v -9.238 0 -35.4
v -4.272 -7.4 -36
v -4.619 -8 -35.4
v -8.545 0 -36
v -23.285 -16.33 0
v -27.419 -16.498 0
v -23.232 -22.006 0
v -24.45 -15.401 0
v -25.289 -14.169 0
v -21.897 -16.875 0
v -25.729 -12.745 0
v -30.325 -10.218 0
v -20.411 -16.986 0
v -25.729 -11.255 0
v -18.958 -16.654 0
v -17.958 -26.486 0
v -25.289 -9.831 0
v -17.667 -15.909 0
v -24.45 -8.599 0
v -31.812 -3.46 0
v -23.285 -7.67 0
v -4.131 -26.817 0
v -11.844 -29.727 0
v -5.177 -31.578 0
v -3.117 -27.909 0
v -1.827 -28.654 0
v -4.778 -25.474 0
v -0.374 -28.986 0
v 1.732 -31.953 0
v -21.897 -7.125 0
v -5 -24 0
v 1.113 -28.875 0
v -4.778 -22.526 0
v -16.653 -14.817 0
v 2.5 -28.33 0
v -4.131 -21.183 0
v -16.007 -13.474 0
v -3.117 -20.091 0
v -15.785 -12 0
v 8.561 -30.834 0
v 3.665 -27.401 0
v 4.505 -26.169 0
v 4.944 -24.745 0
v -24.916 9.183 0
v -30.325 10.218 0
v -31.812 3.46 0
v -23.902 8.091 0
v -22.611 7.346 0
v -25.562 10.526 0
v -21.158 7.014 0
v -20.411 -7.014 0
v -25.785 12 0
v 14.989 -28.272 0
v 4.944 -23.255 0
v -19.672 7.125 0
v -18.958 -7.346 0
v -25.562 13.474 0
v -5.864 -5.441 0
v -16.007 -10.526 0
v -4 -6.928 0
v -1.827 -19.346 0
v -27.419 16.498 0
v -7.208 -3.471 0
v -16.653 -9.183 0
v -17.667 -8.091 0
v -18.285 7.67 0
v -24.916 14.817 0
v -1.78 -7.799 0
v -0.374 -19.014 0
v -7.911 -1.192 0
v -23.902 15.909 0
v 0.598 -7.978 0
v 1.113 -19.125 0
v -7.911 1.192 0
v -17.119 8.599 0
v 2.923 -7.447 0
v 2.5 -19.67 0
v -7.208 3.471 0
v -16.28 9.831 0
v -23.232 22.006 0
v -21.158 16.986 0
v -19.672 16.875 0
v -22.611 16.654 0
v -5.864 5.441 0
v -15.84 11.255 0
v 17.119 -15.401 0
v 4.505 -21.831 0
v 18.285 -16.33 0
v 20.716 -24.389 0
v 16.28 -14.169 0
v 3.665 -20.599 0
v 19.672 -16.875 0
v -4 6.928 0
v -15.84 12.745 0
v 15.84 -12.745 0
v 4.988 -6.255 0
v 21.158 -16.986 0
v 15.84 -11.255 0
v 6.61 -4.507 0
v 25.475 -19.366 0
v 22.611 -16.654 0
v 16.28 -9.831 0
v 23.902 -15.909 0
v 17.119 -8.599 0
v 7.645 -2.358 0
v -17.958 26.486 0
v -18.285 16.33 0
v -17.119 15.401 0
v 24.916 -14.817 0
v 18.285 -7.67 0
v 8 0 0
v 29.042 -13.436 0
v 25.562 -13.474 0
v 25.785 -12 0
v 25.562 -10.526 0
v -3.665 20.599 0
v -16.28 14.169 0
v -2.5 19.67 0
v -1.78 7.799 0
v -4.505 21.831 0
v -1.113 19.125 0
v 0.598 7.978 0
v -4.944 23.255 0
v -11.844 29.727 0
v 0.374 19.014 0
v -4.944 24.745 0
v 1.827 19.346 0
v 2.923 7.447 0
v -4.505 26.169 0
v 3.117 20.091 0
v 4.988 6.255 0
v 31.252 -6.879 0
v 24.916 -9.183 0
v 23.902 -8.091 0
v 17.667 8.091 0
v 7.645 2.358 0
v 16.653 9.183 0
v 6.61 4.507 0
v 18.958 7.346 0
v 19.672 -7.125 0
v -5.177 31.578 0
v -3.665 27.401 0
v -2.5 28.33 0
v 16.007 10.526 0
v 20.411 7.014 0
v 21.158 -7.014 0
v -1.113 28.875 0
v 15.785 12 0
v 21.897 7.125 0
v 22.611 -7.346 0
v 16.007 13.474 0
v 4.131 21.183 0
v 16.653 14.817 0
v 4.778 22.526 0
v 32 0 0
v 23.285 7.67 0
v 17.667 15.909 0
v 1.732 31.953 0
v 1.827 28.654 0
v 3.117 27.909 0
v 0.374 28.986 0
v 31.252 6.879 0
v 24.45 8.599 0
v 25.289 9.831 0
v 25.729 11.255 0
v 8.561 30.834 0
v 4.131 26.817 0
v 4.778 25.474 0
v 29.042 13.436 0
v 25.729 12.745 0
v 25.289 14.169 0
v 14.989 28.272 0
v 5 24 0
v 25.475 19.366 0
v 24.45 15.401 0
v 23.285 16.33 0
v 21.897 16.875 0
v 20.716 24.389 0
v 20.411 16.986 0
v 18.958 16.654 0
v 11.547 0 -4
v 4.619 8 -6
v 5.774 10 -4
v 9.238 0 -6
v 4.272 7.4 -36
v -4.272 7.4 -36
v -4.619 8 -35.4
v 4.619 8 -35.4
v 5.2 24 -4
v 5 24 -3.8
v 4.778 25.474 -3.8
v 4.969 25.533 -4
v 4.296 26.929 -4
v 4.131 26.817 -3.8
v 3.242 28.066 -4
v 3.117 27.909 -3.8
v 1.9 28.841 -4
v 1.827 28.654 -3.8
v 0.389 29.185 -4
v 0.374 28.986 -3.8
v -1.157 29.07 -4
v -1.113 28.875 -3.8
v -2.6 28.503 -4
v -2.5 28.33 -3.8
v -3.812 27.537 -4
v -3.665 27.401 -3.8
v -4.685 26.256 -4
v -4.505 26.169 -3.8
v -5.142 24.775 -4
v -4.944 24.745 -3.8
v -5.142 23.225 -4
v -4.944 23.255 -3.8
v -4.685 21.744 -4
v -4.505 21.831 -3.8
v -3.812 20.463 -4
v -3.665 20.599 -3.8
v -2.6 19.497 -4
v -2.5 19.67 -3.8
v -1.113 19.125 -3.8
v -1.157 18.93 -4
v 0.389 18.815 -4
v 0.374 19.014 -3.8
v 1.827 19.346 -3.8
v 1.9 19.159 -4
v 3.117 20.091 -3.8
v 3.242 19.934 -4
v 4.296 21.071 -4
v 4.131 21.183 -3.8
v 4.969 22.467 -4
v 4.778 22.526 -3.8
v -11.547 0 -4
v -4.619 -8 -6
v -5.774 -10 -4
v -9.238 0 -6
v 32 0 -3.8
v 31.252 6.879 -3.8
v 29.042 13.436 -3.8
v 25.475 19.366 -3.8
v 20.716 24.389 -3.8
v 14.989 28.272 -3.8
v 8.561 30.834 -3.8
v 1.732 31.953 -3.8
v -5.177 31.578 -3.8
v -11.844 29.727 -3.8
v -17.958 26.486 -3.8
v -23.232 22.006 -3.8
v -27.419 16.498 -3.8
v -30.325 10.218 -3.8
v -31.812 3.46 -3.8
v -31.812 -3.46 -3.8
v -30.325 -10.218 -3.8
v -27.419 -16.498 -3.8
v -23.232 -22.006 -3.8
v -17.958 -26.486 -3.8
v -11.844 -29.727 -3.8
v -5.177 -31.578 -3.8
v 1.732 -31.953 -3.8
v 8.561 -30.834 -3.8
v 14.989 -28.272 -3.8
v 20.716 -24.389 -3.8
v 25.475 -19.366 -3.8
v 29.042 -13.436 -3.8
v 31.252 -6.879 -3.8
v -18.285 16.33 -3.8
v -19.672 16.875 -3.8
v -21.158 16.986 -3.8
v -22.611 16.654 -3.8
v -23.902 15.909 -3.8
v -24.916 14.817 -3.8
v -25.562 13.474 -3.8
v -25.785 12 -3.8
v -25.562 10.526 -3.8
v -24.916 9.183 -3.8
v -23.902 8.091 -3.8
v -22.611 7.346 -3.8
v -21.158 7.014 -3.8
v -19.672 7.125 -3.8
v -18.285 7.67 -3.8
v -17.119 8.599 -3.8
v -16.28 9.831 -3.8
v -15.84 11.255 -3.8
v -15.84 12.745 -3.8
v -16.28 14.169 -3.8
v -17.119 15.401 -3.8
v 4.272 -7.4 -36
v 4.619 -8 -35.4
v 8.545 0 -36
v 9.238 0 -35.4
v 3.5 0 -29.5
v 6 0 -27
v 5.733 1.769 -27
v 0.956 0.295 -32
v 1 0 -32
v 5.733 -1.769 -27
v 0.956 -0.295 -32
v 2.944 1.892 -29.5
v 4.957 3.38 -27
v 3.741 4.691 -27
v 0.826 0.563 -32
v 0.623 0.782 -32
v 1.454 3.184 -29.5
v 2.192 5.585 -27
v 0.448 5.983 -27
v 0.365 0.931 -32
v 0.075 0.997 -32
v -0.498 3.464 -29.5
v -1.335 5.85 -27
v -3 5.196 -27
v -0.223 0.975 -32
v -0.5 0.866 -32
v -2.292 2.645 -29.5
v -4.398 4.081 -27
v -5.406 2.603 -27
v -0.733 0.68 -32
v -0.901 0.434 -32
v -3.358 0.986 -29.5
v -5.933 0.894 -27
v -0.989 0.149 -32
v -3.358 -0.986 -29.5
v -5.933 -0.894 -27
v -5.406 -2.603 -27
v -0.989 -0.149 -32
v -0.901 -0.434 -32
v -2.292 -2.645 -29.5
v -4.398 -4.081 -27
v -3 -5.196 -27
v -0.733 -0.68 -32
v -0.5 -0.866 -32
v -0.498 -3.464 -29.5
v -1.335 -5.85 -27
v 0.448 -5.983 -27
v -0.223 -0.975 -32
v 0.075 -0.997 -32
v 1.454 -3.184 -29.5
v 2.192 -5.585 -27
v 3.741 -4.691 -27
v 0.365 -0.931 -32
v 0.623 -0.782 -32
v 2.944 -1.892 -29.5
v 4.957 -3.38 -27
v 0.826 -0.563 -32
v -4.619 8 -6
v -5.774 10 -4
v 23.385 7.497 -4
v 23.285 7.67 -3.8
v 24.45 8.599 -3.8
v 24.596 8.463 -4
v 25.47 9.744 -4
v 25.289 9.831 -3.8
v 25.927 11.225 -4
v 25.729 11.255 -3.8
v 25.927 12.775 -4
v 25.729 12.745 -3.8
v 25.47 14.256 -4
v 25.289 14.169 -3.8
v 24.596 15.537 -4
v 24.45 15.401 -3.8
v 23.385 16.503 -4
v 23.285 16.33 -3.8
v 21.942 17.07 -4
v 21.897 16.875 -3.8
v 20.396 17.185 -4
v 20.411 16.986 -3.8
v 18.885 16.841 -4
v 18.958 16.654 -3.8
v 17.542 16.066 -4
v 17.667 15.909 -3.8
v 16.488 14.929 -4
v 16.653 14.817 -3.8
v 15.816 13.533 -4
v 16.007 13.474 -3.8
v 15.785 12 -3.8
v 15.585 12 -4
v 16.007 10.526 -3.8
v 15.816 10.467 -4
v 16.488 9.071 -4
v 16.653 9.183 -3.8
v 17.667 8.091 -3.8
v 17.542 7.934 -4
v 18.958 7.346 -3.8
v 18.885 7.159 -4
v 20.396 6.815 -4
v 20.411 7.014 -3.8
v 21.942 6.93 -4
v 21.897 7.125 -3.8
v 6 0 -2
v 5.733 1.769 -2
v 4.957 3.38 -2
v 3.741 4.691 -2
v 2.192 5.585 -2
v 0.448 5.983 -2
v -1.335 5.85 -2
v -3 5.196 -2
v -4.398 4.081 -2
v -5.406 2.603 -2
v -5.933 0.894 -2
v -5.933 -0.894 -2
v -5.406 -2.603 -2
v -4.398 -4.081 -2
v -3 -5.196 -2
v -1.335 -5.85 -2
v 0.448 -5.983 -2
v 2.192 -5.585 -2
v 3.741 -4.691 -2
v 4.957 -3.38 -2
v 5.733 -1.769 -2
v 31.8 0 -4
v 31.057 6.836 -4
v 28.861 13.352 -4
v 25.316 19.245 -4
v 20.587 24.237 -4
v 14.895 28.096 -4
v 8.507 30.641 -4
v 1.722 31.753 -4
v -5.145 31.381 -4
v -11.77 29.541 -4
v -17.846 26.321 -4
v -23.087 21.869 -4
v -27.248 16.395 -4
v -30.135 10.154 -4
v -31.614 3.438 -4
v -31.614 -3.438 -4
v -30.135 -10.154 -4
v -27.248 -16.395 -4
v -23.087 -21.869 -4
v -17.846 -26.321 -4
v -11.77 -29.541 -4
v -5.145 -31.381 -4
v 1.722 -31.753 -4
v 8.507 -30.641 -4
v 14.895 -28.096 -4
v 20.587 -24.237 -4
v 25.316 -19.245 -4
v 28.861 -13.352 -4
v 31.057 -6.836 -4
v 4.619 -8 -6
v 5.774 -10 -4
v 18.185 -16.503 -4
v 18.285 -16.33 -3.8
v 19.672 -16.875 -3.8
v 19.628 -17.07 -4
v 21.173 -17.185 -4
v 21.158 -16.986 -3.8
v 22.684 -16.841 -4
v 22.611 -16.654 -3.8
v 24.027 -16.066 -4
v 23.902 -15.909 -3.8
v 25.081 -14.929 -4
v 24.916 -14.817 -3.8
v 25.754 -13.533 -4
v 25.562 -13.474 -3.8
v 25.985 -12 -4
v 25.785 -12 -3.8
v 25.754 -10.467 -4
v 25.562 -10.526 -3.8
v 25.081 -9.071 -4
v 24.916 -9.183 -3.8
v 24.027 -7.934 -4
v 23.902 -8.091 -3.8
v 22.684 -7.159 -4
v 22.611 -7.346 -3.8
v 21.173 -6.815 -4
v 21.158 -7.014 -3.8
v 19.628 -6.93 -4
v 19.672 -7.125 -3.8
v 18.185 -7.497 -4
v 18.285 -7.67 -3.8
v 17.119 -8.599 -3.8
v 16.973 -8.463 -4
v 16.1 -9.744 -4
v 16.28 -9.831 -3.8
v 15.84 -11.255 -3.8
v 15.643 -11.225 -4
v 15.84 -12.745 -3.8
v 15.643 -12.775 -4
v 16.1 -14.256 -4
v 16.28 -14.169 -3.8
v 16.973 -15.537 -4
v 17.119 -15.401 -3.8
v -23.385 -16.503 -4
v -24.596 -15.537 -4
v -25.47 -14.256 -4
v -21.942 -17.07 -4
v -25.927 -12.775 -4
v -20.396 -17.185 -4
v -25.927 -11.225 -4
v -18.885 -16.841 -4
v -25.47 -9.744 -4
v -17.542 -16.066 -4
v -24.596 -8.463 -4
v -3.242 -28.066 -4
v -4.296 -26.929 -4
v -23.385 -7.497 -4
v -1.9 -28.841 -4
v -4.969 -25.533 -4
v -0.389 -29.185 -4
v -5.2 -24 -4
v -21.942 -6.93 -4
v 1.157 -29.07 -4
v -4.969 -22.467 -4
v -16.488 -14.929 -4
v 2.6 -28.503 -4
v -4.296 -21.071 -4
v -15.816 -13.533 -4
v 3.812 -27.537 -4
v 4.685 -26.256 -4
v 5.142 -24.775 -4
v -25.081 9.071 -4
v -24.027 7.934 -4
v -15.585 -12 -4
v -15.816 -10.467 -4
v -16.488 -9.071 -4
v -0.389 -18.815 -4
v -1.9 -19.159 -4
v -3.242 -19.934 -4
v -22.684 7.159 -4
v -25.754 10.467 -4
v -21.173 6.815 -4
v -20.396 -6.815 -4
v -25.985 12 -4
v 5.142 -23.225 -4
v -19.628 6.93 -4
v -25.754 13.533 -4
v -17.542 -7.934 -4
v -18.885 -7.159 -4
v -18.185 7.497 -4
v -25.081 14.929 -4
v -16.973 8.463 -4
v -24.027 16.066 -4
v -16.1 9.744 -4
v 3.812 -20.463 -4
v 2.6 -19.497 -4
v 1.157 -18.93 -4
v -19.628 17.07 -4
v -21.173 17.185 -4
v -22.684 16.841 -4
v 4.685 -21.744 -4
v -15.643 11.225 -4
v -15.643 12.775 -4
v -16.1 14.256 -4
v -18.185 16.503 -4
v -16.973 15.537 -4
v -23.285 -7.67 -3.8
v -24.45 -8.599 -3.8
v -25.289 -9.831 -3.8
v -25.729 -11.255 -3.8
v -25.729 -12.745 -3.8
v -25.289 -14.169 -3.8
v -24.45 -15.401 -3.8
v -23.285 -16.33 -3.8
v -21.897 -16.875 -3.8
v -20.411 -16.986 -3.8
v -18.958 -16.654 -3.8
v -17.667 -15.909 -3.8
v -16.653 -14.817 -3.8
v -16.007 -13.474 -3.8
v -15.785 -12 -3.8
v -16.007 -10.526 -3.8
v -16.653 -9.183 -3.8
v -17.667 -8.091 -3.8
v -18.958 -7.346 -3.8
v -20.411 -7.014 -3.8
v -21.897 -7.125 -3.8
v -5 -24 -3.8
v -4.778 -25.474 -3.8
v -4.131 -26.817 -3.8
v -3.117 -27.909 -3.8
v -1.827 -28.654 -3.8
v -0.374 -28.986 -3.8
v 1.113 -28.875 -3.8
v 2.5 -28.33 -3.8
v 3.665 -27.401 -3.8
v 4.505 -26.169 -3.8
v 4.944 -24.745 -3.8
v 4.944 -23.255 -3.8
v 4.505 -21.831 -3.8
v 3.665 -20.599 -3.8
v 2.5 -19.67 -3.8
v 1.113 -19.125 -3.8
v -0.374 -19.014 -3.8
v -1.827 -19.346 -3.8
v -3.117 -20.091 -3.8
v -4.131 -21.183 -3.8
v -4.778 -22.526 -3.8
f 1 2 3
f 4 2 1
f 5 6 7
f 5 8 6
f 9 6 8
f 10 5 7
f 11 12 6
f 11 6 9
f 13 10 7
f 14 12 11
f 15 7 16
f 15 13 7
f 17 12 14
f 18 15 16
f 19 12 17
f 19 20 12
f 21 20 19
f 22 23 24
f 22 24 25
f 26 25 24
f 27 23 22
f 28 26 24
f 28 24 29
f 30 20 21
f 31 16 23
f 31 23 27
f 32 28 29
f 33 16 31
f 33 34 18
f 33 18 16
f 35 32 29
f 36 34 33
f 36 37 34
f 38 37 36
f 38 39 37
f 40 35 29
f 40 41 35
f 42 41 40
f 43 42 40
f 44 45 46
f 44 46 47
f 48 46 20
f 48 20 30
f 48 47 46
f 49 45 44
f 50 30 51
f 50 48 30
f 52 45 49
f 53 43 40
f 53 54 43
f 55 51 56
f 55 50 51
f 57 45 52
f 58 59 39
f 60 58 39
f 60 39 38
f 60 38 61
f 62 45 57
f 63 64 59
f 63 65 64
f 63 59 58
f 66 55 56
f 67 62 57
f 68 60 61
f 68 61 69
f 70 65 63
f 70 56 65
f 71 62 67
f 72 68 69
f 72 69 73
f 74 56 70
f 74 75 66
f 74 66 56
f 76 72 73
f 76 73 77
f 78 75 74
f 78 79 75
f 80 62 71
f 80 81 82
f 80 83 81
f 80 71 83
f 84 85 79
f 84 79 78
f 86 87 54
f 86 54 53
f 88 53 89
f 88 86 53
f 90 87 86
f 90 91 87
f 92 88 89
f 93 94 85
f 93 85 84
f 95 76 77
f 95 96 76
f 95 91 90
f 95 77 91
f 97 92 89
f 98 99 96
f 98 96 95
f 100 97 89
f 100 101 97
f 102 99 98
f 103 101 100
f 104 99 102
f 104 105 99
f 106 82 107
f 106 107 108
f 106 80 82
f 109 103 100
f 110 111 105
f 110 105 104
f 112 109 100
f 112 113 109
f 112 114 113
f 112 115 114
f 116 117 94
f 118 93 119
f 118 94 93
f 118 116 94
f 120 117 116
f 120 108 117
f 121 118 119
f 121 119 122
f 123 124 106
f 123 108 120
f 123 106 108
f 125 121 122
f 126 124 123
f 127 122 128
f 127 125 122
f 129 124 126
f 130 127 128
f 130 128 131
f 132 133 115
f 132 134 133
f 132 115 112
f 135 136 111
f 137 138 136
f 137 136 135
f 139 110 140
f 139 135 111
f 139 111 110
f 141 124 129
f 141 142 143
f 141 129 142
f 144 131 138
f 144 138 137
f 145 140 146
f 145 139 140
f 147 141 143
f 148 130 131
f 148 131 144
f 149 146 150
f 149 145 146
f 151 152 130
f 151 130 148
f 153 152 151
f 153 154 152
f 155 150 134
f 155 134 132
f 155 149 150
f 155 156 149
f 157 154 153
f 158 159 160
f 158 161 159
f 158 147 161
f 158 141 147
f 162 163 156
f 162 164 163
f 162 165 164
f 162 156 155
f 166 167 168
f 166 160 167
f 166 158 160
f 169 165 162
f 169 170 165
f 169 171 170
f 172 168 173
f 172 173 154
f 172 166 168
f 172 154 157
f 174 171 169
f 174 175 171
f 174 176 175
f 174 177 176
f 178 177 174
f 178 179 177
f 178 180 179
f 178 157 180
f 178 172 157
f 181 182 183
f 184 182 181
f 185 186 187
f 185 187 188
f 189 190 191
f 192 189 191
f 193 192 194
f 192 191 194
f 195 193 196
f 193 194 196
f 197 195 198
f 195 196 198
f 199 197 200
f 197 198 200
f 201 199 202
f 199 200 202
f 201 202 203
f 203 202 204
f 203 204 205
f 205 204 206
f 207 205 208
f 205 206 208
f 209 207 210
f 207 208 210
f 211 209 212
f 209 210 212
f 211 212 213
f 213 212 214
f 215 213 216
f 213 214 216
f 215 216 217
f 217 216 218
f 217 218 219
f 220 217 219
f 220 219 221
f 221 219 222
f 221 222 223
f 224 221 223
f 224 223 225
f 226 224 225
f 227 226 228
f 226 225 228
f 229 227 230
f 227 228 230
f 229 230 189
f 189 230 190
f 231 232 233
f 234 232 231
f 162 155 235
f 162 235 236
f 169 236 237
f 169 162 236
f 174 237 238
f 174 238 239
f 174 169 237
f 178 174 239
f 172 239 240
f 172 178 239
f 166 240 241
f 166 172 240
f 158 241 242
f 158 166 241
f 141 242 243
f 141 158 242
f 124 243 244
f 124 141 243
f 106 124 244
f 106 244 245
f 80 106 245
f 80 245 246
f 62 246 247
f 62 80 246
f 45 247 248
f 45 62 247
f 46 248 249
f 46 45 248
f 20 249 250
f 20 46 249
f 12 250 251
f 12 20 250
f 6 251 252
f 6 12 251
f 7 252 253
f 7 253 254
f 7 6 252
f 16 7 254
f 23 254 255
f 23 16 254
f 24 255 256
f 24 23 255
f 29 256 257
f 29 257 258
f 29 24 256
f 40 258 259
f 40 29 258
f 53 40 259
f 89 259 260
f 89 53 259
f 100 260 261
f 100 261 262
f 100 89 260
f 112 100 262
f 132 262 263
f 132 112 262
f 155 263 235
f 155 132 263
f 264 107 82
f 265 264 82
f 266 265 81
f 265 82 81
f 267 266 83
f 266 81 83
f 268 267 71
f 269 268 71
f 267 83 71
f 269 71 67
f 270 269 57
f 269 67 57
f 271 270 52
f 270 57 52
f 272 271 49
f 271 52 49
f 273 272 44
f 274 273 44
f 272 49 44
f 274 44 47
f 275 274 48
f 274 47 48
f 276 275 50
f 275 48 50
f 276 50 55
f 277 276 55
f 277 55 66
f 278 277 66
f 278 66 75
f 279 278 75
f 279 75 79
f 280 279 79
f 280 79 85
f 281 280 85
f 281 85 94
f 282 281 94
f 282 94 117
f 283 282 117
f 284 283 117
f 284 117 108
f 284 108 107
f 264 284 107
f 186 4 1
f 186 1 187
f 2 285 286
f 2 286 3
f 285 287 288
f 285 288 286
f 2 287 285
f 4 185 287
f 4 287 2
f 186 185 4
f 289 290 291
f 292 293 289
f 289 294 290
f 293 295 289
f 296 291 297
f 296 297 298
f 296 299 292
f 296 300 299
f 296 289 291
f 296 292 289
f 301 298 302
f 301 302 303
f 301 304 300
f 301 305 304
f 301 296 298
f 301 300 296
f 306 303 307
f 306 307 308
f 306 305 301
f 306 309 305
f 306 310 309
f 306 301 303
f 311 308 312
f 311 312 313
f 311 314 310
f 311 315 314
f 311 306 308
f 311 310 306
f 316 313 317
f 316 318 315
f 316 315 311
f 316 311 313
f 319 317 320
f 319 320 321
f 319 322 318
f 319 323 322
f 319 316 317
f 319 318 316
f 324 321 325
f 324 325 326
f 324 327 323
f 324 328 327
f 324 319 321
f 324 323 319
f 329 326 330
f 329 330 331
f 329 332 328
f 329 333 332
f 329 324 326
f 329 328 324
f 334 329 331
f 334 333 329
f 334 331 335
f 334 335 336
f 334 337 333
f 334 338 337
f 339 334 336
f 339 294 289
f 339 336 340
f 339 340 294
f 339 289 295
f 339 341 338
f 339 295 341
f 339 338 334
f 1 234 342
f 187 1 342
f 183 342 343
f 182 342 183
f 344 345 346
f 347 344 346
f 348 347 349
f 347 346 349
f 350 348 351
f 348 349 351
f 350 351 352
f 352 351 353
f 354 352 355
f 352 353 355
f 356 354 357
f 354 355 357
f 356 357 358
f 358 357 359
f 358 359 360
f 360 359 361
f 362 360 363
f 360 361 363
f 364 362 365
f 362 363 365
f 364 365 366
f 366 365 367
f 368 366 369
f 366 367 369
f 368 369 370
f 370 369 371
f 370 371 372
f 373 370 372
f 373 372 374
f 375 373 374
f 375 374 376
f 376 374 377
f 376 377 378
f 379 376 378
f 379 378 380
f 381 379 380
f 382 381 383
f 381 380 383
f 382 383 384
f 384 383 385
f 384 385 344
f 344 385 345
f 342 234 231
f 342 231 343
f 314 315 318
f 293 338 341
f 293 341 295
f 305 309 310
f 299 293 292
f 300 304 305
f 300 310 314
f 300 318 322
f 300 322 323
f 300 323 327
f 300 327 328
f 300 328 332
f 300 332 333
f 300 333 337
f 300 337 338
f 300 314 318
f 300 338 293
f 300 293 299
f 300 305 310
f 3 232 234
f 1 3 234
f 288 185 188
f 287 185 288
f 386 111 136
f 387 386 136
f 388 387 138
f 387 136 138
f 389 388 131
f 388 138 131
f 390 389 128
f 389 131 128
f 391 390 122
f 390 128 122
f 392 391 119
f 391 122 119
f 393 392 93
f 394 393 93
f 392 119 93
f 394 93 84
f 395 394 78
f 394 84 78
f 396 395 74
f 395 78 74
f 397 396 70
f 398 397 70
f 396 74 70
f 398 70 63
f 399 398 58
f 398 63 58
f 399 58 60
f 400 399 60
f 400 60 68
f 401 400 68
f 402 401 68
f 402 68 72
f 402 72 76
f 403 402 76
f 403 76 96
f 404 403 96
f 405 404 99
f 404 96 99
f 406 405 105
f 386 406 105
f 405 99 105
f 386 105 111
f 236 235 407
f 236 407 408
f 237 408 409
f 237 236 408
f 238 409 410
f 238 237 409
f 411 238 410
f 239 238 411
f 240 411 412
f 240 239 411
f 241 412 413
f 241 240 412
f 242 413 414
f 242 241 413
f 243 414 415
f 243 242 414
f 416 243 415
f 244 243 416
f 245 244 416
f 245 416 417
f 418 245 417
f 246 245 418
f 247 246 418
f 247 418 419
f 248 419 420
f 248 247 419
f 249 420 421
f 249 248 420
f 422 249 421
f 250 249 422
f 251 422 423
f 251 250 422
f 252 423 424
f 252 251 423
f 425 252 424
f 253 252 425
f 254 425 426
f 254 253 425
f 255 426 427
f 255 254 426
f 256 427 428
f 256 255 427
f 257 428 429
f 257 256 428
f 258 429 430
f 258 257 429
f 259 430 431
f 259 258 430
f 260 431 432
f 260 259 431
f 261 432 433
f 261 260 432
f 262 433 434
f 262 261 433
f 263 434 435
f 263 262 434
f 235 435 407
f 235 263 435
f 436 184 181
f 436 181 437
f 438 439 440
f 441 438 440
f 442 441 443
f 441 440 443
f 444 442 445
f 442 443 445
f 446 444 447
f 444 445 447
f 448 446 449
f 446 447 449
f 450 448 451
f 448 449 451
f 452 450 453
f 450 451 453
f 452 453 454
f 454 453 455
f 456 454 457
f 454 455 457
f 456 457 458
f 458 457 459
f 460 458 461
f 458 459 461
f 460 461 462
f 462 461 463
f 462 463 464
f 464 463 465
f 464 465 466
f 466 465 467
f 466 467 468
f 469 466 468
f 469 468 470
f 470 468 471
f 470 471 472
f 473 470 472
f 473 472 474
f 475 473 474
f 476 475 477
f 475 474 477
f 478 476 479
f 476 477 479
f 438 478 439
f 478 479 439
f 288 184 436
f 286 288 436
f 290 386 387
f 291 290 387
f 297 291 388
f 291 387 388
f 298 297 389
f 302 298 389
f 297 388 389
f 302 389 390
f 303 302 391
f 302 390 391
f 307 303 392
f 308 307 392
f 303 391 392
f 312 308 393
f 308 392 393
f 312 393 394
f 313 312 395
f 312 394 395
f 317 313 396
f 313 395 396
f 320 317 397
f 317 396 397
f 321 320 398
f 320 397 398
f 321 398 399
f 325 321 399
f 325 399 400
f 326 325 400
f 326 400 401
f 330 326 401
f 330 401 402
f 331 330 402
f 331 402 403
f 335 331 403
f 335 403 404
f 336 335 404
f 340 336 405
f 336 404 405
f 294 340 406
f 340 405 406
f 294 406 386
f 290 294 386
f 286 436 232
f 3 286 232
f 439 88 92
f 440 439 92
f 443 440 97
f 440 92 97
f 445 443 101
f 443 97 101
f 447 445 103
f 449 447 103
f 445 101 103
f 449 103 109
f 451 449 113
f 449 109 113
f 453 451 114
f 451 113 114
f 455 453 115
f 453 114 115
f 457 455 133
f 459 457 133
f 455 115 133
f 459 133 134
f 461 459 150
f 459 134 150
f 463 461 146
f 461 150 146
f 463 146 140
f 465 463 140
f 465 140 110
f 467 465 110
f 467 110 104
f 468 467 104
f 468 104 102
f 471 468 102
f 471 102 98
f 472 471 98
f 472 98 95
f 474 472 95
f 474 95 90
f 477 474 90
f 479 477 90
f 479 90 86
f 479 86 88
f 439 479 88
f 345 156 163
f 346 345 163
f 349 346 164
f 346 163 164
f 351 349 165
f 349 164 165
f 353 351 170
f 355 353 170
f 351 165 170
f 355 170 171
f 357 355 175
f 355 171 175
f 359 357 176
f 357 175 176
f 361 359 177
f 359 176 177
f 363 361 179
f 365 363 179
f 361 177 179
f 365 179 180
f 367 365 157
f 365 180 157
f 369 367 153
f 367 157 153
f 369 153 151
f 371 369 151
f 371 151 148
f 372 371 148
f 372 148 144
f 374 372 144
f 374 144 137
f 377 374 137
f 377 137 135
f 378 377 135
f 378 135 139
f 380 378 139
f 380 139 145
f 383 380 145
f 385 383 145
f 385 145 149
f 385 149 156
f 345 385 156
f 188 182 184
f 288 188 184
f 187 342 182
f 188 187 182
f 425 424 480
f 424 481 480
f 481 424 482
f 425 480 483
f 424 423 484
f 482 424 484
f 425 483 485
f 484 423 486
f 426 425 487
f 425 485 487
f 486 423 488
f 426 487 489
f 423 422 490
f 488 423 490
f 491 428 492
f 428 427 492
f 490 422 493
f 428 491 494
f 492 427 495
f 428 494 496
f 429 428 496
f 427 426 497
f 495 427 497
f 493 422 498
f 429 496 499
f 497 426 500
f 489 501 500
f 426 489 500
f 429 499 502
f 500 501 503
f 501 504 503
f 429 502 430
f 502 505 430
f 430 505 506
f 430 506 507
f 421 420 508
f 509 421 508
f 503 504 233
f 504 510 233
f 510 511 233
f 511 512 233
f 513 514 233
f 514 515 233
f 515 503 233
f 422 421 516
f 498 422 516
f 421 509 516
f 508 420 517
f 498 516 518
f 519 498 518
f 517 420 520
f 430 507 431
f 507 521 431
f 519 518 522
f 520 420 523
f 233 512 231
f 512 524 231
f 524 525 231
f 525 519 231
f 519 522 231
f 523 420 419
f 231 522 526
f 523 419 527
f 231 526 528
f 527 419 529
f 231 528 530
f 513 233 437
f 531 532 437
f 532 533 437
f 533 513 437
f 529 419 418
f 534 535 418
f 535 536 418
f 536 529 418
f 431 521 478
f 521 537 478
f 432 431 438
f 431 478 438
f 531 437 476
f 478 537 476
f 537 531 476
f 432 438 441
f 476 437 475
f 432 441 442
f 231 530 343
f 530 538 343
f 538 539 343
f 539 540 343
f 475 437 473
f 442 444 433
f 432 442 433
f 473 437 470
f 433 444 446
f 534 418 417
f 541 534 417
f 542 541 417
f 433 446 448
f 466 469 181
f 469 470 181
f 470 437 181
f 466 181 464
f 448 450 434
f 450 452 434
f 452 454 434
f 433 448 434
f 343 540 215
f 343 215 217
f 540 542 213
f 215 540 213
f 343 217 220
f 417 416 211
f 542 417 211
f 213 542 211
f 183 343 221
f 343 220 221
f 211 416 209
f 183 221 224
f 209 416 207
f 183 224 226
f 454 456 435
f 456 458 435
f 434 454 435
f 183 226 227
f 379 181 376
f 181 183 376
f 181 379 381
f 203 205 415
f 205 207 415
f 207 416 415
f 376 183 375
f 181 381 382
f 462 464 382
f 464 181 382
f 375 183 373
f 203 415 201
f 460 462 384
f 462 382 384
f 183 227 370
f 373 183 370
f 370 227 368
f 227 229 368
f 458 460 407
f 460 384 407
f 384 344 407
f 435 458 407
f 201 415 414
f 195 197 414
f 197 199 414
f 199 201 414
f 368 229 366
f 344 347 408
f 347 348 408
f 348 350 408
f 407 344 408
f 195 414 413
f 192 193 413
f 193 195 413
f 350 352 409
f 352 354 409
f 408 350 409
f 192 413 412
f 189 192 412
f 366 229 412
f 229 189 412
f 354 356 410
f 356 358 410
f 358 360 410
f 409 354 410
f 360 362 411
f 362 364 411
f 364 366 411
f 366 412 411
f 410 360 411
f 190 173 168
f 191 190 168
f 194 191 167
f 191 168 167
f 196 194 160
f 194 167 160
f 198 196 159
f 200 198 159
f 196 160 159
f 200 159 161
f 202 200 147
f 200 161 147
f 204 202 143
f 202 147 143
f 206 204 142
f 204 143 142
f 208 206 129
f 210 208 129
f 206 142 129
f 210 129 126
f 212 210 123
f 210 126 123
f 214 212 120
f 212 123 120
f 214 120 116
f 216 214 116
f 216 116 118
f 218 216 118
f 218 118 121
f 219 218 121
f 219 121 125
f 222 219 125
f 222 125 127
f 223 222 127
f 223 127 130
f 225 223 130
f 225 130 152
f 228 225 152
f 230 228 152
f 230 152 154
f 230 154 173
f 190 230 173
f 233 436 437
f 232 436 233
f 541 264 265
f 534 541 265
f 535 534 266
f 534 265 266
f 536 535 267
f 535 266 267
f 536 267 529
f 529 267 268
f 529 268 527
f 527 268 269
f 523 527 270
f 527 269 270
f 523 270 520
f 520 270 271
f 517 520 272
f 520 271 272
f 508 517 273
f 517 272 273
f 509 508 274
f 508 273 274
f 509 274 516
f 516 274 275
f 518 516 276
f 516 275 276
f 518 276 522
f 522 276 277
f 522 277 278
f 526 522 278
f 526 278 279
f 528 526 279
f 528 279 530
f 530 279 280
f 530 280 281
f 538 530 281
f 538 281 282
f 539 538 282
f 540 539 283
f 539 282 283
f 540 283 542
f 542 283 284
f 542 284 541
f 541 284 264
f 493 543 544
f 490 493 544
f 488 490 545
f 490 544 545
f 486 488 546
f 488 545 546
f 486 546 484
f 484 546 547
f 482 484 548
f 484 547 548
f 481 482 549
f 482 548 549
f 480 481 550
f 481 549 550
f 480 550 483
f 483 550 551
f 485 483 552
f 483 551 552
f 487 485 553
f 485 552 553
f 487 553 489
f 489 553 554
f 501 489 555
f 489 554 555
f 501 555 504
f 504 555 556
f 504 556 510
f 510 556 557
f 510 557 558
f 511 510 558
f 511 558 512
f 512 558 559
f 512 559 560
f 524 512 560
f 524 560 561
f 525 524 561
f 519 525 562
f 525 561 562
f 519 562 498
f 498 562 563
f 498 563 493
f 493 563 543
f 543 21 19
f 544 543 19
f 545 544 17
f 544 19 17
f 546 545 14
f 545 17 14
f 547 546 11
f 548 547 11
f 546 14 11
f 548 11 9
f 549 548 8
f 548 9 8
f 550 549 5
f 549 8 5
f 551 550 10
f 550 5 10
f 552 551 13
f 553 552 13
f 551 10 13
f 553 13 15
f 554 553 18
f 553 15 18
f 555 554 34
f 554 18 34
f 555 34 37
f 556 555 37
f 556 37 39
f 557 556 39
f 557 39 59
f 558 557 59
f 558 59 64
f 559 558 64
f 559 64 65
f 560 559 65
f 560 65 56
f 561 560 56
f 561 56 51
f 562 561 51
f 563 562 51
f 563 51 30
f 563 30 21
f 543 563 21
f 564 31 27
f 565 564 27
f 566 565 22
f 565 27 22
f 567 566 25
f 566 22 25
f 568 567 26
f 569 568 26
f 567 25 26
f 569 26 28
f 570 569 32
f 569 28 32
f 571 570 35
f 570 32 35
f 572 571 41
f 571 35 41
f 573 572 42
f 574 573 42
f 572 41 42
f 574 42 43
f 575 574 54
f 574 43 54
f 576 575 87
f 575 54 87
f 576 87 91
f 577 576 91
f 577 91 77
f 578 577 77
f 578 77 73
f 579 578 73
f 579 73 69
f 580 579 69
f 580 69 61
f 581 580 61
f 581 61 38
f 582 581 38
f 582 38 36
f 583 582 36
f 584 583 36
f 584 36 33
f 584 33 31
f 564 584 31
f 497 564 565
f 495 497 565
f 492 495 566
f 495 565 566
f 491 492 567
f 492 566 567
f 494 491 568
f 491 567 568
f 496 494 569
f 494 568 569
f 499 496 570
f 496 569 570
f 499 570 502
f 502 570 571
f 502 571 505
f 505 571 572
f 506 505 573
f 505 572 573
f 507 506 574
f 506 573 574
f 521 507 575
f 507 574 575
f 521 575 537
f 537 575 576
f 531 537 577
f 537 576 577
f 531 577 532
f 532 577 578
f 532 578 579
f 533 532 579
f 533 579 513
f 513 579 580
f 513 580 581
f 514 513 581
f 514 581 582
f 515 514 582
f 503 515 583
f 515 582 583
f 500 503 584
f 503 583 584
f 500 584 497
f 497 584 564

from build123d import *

# Parameters (mm, degrees)
SKETCH1_R           = 32
BOSS_EXTRUDE1_DEPTH = 4
SKETCH2_R           = 5
CUT_EXTRUDE1_DEPTH  = 5
CIRPATTERN1_COUNT   = 6
BOSS_EXTRUDE2_DEPTH = 32
CHAMFER1_SIZE       = 2
CHAMFER2_SIZE       = 0.2
SKETCH4_R           = 6
CUT_EXTRUDE2_DEPTH  = 32
CHAMFER3_SIZE       = 0.6
CHAMFER4_SIZE       = 5
CHAMFER5_SIZE       = 2


with BuildPart() as part:
    # Sketch1 → Boss-Extrude1 (new body)
    with BuildSketch(Plane.XY):
        Circle(SKETCH1_R)
    extrude(amount=-BOSS_EXTRUDE1_DEPTH)

    # Sketch2 → Cut-Extrude1 (cut, through all)
    with BuildSketch(Plane.XY):
        with Locations((0, 24)):
            Circle(SKETCH2_R)
    cut_extrude1 = extrude(amount=-CUT_EXTRUDE1_DEPTH, mode=Mode.SUBTRACT)

    # CirPattern1: Cut-Extrude1 ×6 about axis
    cirpattern1_axis = Axis((0, 0, 0), (0, 0, 1))
    for i in range(1, CIRPATTERN1_COUNT):
        add(cut_extrude1.rotate(cirpattern1_axis, i * 360 / CIRPATTERN1_COUNT), mode=Mode.SUBTRACT)

    # Sketch3 → Boss-Extrude2 (add)
    with BuildSketch(Plane(origin=(0, 0, -4), x_dir=(-1, 0, 0), z_dir=(0, 0, -1))):
        Polygon((-4.618802154, 8), (-9.237604307, 0), (-4.618802154, -8), (4.618802154, -8), (9.237604307, 0), (4.618802154, 8), align=None)
    extrude(amount=BOSS_EXTRUDE2_DEPTH)

    # Chamfer1
    chamfer1_edges = [part.edges().sort_by_distance(p)[0] for p in [
        (0, 8, -4),
        (6.92820323, 4, -4),
        (6.92820323, -4, -4),
        (0, -8, -4),
        (-6.92820323, -4, -4),
        (-6.92820323, 4, -4),
    ]]
    chamfer(chamfer1_edges, length=CHAMFER1_SIZE)

    # Chamfer2
    chamfer2_edges = [part.edges().sort_by_distance(p)[0] for p in [
        (-23.284609691, 7.669872981, -4),
        (-18.284609691, -16.330127019, -4),
        (5, -24, -4),
        (23.284609691, -7.669872981, -4),
        (18.284609691, 16.330127019, -4),
        (-32, 0, -4),
        (-5, 24, -4),
    ]]
    chamfer(chamfer2_edges, length=CHAMFER2_SIZE)

    # Sketch4 → Cut-Extrude2 (cut)
    with BuildSketch(Plane.XY):
        Circle(SKETCH4_R)
    extrude(amount=-CUT_EXTRUDE2_DEPTH, mode=Mode.SUBTRACT)

    # Chamfer3
    chamfer3_edges = [part.edges().sort_by_distance(p)[0] for p in [
        (0, 8, -36),
        (6.92820323, 4, -36),
        (6.92820323, -4, -36),
        (0, -8, -36),
        (-6.92820323, -4, -36),
        (-6.92820323, 4, -36),
    ]]
    chamfer(chamfer3_edges, length=CHAMFER3_SIZE)

    # Chamfer4
    chamfer4_edges = [part.edges().sort_by_distance(p)[0] for p in [
        (-6, 0, -32),
    ]]
    chamfer(chamfer4_edges, length=CHAMFER4_SIZE)

    # Chamfer5
    chamfer5_edges = [part.edges().sort_by_distance(p)[0] for p in [
        (-6, 0, 0),
    ]]
    chamfer(chamfer5_edges, length=CHAMFER5_SIZE)


solid = part.part
